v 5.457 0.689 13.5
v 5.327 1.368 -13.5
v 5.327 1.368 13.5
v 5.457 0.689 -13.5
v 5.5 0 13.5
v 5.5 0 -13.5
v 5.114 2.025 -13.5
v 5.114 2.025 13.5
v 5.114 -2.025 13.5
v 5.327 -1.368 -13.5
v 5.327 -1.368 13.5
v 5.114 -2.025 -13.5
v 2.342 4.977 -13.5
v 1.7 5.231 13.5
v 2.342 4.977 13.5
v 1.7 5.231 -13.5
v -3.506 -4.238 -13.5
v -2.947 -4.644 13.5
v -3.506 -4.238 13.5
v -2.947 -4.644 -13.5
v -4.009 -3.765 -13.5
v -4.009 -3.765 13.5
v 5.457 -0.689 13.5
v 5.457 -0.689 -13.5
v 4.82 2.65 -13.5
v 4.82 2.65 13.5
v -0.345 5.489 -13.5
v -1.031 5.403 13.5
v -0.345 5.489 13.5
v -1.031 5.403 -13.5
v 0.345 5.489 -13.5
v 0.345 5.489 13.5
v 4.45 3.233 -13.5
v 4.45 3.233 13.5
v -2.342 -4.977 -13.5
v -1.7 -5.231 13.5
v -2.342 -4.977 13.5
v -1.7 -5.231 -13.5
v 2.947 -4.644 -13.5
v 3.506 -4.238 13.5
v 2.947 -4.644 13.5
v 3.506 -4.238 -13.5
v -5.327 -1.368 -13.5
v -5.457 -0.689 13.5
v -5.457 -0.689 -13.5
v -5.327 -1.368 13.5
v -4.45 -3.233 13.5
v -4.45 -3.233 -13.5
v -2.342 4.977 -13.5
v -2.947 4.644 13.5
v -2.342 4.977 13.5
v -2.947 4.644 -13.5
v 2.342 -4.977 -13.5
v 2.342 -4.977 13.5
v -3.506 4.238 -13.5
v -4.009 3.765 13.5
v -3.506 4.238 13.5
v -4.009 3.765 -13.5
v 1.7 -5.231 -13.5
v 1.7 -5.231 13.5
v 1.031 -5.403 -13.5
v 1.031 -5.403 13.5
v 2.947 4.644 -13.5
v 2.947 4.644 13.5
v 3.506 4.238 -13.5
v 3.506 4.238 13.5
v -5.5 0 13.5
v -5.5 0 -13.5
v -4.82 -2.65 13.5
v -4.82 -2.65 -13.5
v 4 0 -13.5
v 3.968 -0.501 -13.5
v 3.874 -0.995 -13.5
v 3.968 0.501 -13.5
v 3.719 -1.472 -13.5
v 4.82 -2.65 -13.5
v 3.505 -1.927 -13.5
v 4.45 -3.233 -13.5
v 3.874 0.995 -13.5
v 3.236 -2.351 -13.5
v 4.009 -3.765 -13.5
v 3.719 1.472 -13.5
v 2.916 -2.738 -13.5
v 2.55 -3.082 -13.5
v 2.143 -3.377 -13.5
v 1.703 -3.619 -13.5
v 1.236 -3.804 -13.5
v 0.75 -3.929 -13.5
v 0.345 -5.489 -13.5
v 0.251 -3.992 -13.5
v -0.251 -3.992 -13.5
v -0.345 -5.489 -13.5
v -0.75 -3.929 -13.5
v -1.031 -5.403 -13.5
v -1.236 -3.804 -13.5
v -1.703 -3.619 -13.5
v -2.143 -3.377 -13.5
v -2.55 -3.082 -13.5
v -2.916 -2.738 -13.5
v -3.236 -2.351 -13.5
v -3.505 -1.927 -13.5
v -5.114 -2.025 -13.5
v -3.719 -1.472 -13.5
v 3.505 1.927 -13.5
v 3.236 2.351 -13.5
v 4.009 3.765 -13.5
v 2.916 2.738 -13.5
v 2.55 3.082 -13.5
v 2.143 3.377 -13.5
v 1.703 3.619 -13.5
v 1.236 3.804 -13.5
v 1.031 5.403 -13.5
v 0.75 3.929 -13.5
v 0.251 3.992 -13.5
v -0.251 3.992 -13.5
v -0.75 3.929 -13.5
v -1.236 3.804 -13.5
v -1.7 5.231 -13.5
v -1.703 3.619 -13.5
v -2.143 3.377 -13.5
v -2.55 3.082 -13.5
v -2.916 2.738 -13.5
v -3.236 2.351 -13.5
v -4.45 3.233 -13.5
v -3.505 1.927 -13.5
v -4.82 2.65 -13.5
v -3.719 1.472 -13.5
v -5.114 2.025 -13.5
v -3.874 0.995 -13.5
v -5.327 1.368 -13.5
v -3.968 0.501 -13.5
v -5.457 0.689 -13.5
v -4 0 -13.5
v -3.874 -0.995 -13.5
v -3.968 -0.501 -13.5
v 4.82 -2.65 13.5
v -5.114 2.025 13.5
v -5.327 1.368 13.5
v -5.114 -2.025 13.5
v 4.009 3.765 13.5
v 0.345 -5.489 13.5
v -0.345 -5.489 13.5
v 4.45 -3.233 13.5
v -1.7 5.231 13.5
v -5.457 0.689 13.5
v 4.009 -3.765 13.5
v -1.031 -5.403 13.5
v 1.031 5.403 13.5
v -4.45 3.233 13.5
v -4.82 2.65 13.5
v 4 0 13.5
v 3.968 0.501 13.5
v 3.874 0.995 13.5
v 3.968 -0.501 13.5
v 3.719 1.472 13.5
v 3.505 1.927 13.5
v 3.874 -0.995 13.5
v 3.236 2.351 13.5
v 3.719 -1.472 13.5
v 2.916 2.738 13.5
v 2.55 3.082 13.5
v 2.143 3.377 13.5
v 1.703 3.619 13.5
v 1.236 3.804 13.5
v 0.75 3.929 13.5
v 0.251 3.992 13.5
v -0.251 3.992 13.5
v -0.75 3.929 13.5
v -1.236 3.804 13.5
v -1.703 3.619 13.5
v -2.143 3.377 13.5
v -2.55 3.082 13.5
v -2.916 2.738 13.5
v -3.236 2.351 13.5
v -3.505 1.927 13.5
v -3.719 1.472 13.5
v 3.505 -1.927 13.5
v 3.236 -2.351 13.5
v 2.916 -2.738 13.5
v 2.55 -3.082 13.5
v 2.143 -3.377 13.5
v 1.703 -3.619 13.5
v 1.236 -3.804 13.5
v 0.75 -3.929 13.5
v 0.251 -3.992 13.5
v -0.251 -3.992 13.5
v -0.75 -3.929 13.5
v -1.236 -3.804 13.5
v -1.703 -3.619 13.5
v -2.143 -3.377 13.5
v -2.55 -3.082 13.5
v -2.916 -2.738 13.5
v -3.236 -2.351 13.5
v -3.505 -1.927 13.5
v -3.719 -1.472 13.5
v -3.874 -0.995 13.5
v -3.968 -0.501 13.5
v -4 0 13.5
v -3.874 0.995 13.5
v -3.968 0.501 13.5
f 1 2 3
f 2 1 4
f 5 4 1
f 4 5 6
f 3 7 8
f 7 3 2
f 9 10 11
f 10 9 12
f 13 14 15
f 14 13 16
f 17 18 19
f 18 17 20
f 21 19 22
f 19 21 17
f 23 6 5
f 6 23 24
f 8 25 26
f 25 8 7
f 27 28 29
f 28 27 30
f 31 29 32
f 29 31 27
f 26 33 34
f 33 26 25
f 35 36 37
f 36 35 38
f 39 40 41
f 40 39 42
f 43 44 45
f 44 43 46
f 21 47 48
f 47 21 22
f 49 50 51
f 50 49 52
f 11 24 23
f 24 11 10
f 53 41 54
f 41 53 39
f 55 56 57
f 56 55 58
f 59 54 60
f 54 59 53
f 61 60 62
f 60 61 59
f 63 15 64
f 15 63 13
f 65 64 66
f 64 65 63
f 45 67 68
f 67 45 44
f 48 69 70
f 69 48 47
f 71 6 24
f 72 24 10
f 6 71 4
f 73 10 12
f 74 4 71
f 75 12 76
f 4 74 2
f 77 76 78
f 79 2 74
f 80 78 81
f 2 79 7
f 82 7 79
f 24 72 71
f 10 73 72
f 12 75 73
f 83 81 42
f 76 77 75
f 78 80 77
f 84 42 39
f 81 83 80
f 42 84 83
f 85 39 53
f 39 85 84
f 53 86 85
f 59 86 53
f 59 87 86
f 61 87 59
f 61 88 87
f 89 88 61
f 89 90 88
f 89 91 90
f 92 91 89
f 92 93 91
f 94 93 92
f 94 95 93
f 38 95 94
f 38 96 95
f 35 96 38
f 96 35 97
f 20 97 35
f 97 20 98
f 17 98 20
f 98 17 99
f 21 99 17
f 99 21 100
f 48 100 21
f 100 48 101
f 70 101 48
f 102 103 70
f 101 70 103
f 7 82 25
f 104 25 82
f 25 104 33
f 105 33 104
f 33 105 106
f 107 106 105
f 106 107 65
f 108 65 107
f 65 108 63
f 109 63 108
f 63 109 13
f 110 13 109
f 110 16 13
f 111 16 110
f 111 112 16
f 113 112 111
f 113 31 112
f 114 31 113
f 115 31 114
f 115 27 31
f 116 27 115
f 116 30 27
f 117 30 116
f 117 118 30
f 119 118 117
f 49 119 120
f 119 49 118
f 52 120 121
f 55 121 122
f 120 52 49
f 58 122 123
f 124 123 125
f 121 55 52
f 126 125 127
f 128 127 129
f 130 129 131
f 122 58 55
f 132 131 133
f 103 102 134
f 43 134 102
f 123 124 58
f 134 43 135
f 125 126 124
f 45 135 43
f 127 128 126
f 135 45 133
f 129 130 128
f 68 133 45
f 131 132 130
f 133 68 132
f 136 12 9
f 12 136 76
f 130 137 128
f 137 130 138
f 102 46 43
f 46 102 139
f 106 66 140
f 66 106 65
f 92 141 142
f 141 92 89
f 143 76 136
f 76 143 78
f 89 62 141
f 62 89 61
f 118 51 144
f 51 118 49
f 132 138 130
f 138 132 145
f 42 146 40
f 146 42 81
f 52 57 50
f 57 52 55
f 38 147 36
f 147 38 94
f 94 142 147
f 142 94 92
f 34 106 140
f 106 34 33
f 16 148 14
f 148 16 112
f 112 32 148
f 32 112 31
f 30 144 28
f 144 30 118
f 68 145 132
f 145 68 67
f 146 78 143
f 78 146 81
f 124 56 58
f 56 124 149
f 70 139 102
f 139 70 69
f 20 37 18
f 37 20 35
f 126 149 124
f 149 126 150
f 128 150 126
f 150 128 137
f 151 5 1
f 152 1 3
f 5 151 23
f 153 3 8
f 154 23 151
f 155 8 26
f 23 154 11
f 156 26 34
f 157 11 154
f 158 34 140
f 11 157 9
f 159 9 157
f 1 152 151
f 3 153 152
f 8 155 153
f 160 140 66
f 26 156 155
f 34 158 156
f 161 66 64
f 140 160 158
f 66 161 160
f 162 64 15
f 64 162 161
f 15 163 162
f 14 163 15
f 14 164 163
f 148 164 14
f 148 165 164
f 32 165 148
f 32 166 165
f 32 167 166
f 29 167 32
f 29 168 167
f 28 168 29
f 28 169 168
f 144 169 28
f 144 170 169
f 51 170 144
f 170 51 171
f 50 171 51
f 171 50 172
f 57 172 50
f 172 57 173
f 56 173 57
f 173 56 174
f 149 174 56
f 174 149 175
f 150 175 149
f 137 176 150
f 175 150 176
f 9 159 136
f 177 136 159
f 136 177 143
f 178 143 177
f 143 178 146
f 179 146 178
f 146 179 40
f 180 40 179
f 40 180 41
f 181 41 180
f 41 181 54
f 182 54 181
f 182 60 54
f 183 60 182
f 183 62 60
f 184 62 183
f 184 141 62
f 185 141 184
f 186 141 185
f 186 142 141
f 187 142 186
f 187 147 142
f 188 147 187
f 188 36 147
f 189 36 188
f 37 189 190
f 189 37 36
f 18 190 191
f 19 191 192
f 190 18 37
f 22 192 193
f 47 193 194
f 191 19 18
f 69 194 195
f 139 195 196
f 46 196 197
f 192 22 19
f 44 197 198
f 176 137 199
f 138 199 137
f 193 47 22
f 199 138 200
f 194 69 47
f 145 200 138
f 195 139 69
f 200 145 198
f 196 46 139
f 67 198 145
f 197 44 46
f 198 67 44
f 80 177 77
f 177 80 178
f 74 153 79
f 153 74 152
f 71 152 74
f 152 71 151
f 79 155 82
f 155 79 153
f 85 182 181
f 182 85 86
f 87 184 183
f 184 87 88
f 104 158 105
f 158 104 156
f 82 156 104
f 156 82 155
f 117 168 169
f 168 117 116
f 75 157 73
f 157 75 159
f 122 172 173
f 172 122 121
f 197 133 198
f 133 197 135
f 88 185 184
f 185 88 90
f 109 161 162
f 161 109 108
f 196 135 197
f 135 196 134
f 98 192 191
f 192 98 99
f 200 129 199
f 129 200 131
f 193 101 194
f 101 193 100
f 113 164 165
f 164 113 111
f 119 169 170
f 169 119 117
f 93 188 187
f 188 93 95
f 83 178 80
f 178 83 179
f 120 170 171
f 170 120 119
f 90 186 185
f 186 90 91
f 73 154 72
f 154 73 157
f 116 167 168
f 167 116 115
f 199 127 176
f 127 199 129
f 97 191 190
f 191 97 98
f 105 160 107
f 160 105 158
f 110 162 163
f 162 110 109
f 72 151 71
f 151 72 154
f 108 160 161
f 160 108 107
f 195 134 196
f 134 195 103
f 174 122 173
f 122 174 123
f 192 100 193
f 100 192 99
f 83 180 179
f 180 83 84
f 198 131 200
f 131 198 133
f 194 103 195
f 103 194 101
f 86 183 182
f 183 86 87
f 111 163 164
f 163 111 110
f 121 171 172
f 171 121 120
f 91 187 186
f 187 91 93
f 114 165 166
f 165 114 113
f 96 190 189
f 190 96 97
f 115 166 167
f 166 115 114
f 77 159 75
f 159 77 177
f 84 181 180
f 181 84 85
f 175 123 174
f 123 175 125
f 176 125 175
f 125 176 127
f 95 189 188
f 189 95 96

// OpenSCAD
$fn = 50;


difference() {
	union() {
		translate(v = [0, 0, -13.5000000000]) {
			cylinder(h = 27, r = 5.5000000000);
		}
	}
	union() {
		translate(v = [0, 0, -100.0000000000]) {
			cylinder(h = 200, r = 4.0000000000);
		}
	}
}
